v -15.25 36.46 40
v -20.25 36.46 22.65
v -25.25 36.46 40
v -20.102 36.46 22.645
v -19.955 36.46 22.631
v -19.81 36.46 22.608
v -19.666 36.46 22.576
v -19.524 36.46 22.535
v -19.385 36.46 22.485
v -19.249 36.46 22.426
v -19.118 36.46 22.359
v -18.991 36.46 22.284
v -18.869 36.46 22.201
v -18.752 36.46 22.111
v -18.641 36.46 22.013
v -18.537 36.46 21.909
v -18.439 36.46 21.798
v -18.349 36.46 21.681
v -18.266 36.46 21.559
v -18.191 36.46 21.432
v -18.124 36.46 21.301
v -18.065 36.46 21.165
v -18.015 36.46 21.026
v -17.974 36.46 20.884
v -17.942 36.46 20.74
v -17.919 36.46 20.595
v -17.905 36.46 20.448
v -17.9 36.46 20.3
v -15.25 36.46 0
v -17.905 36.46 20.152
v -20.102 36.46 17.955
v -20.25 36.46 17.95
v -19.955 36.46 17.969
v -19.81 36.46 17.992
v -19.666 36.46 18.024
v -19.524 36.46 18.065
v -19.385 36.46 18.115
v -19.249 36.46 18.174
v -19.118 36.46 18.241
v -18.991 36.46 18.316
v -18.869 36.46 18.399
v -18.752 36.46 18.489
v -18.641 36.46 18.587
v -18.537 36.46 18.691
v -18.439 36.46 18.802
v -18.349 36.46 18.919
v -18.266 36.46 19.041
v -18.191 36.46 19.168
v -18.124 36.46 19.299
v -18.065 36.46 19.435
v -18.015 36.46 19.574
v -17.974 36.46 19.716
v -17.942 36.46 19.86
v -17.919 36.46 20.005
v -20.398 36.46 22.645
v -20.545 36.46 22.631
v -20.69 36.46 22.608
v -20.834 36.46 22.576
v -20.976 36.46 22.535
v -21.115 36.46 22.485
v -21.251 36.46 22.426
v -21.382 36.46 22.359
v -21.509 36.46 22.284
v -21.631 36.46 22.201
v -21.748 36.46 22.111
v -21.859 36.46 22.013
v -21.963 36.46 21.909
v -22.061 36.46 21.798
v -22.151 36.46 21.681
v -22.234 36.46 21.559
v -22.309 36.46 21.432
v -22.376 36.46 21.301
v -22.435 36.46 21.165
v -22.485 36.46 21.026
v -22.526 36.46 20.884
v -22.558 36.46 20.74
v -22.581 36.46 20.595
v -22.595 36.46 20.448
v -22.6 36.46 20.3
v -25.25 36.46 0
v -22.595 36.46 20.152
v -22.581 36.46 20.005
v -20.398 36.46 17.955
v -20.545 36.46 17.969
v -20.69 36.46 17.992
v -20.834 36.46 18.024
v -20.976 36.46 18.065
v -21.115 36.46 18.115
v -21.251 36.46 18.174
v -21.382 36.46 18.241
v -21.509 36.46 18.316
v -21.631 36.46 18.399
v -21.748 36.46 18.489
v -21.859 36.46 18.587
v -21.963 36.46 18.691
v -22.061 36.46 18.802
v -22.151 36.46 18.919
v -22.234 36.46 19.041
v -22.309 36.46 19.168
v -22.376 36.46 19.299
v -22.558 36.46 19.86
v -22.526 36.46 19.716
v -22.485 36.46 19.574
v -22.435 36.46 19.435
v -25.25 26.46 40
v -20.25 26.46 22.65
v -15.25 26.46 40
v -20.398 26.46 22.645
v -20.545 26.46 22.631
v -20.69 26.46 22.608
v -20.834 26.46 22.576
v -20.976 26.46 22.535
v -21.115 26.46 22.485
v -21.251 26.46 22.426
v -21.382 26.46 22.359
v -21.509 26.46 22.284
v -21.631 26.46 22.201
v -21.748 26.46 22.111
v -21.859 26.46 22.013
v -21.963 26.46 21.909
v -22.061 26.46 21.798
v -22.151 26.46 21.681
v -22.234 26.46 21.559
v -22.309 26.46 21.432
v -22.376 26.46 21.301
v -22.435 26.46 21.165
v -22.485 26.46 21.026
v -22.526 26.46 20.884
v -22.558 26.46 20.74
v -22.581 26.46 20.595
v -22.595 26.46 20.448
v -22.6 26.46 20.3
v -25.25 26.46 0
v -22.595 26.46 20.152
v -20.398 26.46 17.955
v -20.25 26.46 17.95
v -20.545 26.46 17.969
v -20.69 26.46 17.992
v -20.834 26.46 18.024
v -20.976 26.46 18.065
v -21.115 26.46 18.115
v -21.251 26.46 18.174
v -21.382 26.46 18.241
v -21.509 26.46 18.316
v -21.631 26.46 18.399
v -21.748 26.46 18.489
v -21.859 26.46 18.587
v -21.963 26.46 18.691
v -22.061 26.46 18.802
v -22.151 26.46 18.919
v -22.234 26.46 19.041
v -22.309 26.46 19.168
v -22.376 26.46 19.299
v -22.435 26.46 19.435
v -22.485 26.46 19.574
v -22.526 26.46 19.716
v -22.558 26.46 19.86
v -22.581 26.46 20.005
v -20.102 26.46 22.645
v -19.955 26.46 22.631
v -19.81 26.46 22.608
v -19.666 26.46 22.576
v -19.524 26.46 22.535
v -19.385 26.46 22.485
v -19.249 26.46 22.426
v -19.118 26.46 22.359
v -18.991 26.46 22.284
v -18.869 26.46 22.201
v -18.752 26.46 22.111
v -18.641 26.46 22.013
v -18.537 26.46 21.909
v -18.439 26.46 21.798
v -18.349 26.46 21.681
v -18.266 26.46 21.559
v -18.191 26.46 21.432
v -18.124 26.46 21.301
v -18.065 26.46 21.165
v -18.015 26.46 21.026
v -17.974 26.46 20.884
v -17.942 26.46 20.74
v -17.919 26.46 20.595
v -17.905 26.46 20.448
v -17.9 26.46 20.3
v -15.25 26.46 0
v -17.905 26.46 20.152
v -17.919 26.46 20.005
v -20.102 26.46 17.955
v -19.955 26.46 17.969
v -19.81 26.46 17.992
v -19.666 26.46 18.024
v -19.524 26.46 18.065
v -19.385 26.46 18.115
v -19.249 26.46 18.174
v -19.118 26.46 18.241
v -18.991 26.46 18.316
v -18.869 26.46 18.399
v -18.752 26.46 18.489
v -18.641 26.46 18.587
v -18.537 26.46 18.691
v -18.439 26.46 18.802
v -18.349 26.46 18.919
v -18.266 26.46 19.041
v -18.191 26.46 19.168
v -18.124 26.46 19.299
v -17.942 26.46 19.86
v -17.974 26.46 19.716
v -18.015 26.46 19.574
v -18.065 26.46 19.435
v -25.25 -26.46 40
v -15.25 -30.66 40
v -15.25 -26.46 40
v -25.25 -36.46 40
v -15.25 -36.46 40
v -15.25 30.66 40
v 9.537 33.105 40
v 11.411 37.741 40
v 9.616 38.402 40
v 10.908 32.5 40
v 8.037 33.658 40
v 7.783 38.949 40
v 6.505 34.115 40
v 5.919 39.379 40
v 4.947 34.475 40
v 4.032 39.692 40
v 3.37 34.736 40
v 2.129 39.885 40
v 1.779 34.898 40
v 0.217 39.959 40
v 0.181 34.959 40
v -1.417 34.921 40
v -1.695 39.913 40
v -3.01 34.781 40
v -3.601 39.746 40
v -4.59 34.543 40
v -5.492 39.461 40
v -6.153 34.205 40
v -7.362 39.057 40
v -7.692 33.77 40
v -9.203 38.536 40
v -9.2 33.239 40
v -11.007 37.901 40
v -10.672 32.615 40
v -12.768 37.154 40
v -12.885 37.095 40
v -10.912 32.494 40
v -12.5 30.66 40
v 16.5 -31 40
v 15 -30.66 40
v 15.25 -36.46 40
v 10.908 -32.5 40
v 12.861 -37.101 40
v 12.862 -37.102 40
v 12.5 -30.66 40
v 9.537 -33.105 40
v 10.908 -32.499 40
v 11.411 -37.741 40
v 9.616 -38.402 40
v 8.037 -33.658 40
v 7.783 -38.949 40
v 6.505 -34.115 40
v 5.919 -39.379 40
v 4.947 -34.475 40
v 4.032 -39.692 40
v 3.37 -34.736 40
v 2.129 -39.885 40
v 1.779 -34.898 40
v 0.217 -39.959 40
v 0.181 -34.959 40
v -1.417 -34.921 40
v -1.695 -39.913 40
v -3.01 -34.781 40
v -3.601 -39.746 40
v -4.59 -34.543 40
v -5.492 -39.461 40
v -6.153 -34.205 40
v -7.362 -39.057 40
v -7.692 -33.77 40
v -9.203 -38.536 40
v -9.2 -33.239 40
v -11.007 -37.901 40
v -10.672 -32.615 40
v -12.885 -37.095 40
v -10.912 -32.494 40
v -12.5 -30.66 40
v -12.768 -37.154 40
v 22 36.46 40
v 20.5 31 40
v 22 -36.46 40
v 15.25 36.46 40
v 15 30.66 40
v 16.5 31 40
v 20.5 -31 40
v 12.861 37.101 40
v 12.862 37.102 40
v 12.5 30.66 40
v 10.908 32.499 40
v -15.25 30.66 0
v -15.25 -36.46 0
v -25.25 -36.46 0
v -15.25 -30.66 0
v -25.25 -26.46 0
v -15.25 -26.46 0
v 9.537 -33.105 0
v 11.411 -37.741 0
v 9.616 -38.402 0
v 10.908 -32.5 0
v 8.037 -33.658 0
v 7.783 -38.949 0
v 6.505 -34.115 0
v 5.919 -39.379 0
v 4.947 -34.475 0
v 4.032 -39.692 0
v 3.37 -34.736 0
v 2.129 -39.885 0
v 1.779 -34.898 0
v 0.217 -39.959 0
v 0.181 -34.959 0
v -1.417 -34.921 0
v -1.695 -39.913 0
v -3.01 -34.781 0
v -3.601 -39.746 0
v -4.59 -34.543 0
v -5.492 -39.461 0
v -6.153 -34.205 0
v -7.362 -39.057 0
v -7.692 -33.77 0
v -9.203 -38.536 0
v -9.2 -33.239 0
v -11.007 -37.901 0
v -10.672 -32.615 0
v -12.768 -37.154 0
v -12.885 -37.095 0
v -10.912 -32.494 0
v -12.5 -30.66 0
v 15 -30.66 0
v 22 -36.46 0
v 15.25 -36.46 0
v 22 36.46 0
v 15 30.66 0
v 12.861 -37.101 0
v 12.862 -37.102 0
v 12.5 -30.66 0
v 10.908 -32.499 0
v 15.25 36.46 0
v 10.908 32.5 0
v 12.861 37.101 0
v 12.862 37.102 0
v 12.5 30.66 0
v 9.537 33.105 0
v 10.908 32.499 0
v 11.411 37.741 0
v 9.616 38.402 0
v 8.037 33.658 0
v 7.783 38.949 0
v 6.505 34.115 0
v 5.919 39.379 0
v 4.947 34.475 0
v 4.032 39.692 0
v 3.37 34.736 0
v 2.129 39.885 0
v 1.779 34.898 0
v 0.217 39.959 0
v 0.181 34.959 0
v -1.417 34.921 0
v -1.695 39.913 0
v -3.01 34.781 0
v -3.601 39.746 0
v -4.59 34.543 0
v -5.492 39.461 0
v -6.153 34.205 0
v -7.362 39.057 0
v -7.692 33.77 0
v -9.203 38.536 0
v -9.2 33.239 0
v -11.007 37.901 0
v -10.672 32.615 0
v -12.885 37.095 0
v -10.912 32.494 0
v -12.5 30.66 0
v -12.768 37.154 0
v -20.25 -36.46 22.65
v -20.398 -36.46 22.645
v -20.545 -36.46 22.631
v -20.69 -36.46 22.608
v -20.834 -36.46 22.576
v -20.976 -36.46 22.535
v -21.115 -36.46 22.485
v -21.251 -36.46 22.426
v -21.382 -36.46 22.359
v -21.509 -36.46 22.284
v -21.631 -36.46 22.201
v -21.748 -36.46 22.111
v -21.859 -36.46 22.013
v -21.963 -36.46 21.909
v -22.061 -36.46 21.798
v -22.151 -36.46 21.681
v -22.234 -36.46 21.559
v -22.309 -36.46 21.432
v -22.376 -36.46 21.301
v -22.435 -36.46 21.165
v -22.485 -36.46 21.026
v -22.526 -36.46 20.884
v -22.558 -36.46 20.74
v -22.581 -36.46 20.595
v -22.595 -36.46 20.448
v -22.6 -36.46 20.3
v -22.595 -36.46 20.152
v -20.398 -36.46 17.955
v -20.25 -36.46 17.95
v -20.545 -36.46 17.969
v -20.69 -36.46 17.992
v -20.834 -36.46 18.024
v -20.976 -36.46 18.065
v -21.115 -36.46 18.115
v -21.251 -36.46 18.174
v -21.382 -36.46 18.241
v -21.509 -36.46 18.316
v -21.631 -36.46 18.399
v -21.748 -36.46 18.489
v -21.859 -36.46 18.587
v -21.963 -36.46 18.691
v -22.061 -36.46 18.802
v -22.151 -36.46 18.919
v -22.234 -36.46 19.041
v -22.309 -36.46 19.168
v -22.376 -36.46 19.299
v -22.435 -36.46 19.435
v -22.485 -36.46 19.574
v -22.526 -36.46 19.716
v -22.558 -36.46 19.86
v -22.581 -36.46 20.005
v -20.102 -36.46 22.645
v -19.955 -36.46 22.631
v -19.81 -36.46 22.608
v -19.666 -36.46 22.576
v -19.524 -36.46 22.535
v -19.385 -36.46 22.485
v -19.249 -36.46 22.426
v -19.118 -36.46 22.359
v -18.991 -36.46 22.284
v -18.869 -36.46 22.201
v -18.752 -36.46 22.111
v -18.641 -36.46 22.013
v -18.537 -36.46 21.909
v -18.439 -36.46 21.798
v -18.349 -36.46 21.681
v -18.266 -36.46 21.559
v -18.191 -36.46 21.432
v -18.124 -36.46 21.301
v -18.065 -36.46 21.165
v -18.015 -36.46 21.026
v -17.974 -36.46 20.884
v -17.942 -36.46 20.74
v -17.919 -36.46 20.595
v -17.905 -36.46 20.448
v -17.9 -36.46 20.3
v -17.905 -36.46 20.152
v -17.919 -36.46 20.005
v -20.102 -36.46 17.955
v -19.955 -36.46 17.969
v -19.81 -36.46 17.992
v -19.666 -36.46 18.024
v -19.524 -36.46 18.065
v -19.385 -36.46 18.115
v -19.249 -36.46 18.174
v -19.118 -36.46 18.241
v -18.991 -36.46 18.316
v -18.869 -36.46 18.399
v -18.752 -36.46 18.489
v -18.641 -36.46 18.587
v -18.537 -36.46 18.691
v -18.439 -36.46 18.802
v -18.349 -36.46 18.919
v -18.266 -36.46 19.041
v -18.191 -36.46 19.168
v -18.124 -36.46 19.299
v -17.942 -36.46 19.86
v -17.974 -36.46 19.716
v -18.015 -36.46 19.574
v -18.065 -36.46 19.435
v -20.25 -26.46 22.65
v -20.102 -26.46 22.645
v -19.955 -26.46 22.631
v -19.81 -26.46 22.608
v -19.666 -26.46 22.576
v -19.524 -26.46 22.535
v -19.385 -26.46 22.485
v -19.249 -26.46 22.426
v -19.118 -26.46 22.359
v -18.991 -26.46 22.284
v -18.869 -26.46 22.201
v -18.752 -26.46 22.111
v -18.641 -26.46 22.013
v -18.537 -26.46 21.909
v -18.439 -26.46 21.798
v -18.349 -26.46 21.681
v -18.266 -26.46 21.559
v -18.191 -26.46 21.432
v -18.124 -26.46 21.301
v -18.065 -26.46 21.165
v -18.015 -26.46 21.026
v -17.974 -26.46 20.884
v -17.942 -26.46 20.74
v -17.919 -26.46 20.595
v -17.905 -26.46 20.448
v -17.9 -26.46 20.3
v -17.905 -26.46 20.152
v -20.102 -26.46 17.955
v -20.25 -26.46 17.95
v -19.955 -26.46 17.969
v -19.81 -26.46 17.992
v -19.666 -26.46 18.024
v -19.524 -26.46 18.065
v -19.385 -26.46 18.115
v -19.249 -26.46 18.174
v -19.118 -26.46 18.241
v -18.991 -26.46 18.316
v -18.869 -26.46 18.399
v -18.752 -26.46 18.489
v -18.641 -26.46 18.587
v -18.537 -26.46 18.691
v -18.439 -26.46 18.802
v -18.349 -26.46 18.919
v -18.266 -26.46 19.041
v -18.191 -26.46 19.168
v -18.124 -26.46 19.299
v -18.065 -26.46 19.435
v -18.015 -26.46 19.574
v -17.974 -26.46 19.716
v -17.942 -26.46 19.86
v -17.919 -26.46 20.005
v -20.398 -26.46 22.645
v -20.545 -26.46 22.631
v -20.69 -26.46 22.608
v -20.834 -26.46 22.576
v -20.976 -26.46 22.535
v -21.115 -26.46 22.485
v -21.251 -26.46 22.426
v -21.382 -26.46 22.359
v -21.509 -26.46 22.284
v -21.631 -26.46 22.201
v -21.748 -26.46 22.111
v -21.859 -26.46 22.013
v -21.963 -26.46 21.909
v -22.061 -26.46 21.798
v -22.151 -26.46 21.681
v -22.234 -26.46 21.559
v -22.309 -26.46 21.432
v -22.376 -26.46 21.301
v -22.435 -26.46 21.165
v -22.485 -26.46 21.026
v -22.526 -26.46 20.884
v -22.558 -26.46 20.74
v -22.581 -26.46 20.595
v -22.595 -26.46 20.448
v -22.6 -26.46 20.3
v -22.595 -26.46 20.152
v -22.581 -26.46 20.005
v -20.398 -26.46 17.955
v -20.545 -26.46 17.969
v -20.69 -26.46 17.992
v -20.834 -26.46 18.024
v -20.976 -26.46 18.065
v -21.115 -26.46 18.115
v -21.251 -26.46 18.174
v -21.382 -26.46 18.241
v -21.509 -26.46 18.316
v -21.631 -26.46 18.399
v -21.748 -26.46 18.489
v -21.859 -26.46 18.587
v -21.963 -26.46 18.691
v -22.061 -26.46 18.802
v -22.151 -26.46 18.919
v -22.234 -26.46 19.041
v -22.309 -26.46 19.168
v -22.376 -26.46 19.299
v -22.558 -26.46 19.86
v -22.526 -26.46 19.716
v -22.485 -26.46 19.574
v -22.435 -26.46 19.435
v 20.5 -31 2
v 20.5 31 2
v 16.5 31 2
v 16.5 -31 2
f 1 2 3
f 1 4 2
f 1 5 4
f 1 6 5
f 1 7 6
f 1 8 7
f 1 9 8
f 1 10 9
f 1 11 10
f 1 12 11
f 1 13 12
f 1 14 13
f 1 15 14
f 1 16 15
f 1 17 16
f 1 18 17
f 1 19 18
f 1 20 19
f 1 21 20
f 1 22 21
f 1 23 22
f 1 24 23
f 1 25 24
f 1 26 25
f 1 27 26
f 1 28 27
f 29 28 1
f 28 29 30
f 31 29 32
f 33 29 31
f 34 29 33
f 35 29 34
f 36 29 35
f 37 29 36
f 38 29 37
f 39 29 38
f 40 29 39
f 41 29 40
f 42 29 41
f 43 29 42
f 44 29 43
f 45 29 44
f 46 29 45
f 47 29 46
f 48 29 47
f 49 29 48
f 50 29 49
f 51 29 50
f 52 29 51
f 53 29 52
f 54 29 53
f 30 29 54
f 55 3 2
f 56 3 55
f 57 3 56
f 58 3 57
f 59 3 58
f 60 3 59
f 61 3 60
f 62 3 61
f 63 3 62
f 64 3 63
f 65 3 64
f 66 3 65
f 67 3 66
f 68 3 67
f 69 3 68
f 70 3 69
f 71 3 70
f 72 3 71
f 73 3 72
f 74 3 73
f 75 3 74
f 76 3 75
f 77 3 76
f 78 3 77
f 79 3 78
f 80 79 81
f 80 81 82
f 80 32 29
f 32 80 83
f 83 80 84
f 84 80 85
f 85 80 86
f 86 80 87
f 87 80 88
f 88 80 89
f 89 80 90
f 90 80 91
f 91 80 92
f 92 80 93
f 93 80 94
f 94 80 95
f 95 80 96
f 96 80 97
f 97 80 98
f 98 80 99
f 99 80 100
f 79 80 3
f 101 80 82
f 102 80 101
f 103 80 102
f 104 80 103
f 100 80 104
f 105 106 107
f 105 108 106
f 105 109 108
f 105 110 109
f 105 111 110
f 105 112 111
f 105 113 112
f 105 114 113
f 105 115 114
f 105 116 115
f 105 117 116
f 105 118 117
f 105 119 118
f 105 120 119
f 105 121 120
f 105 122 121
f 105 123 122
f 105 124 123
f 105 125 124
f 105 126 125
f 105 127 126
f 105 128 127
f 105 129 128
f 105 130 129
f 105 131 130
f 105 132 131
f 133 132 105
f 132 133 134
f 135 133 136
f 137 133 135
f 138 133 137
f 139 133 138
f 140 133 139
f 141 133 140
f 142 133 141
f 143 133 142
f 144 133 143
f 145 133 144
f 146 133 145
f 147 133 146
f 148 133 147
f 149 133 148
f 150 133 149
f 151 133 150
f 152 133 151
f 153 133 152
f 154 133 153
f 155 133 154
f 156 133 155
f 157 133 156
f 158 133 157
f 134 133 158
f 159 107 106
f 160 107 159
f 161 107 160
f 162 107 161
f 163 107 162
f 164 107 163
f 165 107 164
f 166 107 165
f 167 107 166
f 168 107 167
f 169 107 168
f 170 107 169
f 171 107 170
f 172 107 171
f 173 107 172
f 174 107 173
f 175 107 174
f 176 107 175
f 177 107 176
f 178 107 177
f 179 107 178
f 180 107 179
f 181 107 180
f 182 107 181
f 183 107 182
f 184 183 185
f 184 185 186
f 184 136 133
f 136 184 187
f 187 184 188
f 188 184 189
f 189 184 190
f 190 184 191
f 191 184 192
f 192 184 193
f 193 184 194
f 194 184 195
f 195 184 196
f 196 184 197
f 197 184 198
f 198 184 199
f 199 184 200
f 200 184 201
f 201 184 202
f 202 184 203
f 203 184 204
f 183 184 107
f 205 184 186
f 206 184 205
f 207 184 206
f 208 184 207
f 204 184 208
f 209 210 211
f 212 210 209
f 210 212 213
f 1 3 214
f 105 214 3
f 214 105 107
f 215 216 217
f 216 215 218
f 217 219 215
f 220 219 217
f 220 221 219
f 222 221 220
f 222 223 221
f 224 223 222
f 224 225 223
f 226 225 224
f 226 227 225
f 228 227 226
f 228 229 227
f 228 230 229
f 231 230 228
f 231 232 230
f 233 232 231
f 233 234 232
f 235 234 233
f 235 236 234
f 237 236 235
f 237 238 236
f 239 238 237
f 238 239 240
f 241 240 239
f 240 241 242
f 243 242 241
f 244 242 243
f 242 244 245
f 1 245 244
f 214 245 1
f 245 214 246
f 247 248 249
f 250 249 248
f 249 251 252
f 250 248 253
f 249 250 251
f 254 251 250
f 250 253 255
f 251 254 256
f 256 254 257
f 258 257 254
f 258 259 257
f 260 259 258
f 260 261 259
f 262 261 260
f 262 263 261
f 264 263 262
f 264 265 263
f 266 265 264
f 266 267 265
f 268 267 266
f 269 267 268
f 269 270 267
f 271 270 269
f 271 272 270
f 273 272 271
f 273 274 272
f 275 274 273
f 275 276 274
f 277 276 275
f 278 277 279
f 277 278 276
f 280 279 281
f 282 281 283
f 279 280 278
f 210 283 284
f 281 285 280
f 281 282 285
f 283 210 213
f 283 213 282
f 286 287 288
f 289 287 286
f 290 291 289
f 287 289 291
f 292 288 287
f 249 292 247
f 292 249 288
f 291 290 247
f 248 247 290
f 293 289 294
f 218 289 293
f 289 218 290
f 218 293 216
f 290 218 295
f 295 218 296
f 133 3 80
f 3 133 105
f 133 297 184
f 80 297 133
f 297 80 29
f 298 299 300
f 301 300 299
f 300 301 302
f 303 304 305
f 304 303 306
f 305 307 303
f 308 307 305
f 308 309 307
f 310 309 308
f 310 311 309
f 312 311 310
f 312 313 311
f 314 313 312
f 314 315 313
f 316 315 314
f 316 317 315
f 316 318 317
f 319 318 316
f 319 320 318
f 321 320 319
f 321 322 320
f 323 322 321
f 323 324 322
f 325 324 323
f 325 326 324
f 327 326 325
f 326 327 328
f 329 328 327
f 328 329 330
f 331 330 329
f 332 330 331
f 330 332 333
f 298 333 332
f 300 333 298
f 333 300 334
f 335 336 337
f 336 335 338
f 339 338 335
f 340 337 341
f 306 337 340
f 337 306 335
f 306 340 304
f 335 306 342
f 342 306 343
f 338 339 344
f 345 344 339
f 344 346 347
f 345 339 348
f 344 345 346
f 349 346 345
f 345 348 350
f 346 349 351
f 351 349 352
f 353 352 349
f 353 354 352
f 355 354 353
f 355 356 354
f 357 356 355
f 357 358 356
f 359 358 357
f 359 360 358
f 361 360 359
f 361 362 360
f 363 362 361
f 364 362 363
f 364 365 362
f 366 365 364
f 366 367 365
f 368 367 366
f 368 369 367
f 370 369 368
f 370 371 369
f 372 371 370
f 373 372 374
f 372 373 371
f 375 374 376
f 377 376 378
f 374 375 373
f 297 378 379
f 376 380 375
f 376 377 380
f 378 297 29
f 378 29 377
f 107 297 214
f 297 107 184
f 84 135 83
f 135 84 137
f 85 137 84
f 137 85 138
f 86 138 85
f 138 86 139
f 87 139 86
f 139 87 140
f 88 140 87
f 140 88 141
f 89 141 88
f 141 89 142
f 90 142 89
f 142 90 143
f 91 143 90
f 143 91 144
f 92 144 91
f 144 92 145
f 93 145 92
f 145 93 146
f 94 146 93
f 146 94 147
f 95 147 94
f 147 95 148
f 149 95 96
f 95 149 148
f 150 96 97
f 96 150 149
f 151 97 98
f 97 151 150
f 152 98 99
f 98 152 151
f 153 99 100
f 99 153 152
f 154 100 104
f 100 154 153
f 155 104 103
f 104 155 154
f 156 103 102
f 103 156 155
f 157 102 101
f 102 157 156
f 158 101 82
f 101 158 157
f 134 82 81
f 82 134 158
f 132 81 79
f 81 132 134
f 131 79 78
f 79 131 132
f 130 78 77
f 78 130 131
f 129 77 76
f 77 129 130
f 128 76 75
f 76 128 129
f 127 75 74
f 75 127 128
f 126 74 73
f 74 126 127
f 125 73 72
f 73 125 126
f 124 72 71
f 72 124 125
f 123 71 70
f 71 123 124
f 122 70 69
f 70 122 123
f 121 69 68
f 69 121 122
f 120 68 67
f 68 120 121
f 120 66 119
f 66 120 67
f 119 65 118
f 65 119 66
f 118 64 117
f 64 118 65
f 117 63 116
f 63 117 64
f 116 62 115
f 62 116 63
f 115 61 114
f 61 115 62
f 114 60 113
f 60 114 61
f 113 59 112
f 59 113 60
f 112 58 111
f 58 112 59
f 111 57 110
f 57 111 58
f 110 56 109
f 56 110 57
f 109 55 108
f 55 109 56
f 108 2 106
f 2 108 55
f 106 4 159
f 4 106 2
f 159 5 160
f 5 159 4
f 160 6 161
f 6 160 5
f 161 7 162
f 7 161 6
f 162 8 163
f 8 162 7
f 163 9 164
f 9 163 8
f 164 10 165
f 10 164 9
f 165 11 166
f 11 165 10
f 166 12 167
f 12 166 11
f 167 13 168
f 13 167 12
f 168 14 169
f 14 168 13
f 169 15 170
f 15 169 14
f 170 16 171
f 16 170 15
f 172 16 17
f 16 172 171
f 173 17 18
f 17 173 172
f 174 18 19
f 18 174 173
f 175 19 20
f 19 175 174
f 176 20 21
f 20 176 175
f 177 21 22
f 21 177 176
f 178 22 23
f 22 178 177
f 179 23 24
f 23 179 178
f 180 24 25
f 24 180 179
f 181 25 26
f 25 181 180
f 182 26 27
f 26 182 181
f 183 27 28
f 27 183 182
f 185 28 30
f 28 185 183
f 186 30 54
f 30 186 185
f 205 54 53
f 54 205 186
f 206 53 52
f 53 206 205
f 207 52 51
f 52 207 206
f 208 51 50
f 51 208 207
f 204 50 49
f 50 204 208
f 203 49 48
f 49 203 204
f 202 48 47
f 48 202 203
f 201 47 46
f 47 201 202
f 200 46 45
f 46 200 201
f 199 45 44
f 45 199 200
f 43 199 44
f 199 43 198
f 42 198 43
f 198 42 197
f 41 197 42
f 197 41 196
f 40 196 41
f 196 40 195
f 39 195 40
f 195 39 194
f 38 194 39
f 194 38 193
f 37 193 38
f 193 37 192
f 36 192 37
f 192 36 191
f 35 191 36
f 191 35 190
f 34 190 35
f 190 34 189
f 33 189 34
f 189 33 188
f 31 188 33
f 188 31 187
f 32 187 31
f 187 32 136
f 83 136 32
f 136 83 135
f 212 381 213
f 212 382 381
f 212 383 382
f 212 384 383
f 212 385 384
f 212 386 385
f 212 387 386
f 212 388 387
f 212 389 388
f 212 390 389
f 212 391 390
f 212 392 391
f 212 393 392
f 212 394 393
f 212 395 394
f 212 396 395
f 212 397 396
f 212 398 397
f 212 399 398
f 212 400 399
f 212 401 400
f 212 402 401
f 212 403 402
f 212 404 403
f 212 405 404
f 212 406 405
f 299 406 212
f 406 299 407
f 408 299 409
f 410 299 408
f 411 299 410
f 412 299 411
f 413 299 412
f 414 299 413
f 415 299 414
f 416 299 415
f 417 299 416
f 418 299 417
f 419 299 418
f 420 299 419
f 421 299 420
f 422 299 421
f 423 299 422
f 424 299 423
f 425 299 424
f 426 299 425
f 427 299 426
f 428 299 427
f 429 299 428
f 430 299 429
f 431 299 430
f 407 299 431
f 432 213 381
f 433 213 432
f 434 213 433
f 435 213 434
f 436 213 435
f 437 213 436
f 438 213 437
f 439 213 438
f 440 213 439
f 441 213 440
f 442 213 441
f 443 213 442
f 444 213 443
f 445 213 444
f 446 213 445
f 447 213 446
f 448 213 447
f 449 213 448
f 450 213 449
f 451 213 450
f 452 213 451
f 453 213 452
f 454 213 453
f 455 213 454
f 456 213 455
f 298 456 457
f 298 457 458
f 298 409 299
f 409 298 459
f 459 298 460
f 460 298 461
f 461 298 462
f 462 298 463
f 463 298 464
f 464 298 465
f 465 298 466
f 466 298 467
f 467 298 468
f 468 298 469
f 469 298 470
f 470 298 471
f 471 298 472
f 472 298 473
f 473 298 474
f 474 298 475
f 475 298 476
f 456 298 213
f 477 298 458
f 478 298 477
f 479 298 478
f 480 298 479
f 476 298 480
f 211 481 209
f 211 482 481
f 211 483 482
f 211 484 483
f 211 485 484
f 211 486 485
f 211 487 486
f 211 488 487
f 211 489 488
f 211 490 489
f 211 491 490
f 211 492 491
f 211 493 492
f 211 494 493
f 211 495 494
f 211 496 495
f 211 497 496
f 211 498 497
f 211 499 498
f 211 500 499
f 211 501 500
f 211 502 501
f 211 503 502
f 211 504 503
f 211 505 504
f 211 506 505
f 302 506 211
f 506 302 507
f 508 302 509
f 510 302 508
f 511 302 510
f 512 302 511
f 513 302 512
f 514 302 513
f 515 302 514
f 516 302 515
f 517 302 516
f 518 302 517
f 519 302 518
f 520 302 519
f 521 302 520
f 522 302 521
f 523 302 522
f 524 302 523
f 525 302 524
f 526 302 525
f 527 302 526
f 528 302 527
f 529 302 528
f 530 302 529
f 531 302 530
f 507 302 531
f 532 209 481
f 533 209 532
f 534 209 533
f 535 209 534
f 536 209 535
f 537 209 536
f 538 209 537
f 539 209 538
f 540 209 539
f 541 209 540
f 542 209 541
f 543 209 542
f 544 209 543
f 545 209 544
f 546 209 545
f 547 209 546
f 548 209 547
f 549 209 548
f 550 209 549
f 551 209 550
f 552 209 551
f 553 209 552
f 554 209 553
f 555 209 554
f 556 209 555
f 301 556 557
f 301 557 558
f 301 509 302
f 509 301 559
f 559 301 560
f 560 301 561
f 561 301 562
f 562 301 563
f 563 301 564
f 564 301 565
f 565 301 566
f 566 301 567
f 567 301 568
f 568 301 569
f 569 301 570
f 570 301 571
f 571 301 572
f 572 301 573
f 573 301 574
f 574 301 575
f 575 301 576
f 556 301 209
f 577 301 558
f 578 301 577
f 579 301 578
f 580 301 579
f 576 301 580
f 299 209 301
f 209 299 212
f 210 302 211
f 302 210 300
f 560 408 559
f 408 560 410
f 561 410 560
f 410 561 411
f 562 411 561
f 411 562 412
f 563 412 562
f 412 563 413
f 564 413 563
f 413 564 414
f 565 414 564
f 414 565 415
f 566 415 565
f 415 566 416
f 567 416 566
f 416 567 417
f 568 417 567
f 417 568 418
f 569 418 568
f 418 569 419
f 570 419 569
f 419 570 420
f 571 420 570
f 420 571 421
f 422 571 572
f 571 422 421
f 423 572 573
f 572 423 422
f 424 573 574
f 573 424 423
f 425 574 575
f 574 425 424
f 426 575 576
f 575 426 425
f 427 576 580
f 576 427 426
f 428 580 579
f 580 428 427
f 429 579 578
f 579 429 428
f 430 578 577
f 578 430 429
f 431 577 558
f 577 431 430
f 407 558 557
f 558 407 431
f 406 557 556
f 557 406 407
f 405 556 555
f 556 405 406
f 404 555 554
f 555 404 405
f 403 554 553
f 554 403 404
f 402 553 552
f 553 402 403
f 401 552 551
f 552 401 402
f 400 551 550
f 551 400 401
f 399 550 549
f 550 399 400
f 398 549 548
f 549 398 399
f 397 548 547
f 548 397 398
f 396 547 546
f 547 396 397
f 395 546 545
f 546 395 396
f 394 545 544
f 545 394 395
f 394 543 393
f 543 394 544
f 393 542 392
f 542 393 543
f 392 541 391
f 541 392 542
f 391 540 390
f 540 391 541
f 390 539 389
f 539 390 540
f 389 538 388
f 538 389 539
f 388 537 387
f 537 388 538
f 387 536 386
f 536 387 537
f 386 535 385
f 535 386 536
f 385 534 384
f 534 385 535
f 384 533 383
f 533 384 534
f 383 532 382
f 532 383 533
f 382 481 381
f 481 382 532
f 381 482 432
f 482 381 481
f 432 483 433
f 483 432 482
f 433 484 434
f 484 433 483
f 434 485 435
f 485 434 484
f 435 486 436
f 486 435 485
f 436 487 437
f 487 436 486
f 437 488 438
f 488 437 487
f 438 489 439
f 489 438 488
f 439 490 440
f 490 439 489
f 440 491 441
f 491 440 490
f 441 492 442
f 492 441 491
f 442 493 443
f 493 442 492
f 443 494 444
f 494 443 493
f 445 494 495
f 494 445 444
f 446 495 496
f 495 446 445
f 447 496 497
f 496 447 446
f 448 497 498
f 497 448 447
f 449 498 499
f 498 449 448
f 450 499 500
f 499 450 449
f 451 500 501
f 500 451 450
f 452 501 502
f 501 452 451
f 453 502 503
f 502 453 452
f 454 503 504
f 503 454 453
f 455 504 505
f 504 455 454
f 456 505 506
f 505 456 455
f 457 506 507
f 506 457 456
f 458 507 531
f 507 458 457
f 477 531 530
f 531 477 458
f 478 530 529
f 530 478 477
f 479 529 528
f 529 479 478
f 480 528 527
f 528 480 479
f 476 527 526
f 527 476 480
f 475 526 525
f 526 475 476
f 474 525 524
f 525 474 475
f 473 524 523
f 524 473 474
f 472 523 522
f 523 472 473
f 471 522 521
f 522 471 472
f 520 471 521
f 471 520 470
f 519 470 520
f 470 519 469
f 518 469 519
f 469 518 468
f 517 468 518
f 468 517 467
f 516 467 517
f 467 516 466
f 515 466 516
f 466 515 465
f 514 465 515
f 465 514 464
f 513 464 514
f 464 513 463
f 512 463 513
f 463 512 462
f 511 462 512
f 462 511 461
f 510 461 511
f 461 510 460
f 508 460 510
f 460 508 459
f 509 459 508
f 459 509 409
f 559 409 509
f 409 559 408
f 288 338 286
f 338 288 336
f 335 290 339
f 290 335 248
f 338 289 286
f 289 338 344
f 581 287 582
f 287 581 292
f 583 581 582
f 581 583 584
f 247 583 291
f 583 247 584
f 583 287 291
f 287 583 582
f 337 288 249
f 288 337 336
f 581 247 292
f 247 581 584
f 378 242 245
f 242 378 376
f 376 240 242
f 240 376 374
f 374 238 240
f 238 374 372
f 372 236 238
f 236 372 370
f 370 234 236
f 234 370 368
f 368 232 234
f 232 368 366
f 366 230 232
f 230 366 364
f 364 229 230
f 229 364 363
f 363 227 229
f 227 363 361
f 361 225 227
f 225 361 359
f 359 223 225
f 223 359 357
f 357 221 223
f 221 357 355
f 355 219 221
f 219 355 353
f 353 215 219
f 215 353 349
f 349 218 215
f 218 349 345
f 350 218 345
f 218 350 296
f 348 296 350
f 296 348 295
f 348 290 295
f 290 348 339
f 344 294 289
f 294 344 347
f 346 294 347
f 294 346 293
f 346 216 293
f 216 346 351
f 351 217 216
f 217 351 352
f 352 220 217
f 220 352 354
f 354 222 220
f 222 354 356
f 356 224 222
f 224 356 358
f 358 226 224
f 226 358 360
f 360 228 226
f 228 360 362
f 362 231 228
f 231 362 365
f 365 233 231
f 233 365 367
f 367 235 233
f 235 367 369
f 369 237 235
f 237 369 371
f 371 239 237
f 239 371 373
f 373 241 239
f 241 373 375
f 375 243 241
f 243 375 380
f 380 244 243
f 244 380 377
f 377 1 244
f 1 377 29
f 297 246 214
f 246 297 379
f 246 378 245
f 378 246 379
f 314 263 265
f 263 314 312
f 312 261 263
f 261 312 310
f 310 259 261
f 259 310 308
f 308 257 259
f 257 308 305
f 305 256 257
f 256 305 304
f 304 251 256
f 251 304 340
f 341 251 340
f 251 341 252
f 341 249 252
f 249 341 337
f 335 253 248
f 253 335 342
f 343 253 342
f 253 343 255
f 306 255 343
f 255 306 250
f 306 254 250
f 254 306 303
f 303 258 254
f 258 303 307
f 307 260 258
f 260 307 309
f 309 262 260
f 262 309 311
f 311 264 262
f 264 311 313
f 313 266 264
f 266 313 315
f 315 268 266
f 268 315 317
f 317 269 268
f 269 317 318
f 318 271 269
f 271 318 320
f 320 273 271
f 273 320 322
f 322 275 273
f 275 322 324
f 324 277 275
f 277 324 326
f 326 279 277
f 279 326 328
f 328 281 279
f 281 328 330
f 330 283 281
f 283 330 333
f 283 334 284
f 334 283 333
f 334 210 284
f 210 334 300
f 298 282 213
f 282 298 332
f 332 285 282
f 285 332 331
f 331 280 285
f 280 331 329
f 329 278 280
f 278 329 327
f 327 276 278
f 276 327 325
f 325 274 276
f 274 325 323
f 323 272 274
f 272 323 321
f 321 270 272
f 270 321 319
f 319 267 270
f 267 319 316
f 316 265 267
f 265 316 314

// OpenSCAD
// file: ../../modules/isosceles.scad
module isosceles(height, vertex_angle) polygon(points =
  let (length = height / cos(vertex_angle / 2)) [
    [0, 0],
    [length, 0],
    [length * cos(vertex_angle), length * sin(vertex_angle)]
  ]
);
// file: ../../modules/chord.scad
use <./isosceles.scad>

module chord_ra(r, a, offset_in = undef, offset_out = undef) {
  fallback_offset = is_undef(offset_in) && is_undef(offset_out) ? 0.5 : 1;
  fallback_offset_in = is_undef(offset_out) ? fallback_offset : 0;
  fallback_offset_out = is_undef(offset_in) ? fallback_offset : 0;
  in = is_undef(offset_in) ? fallback_offset_in : offset_in;
  out = is_undef(offset_out) ? fallback_offset_out : offset_out;

  assert(in >= 0, "Invalid argument: offset_in cannot be negative");
  assert(out >= 0, "Invalid argument: offset_out cannot be negative");

  rotate(90 - a / 2) intersection() {
      difference() {
        circle(r=r + out);
        circle(r=r - in);
      }

      // TODO: handle angles >= 180
      isosceles(height=r + out, vertex_angle=a);
    }
}

module chord_lh(l, h, offset_in = undef, offset_out = undef) {
  radius = (l ^ 2) / (8 * h) + h / 2;
  angle = 2 * asin(l / (2 * radius));

  translate([0, h - radius]) chord_ra(
      r=radius,
      a=angle,
      offset_in=offset_in,
      offset_out=offset_out
    );
}
// file: ../../modules/copy_mirror.scad
module copy_mirror(uvec) {
  children();
  mirror(uvec) children();
}
// main file
use <../../modules/copy_mirror.scad>
use <../../modules/chord.scad>

$fn = 100;

thickness = 5;
height = 40;

linear_extrude(height = height) copy_mirror([0, 1]) translate([0, 31.46]) {
  translate([0, 1]) chord_lh(l = 22, h = 2.5, offset_out = thickness);

  copy_mirror([1, 0]) translate([22 / 2, 0]) hull() {
    translate([0, 1]) rotate(67) square([thickness, 0.1]);
    translate([1.5, -0.8]) square([0.1, 0.1]);
    translate([3.25, -0.8]) square([1, 0.8 + thickness]);
  }
}

copy_mirror([0, 1]) translate([-20.25, 36.46, 5]) rotate([90, 0]) linear_extrude(height = 10) difference() {
  translate([-5, -5]) square([10, height]);
  translate([0, height / 2 - 4.7]) circle(d = 4.7);
}

translate([15, 0]) copy_mirror([0, 1]) difference() {
  cube([7, 31.46 + thickness, height]);

  translate([1.5, -0.1, 2]) cube([4, 31 + 0.1, height + 0.1]);
}
